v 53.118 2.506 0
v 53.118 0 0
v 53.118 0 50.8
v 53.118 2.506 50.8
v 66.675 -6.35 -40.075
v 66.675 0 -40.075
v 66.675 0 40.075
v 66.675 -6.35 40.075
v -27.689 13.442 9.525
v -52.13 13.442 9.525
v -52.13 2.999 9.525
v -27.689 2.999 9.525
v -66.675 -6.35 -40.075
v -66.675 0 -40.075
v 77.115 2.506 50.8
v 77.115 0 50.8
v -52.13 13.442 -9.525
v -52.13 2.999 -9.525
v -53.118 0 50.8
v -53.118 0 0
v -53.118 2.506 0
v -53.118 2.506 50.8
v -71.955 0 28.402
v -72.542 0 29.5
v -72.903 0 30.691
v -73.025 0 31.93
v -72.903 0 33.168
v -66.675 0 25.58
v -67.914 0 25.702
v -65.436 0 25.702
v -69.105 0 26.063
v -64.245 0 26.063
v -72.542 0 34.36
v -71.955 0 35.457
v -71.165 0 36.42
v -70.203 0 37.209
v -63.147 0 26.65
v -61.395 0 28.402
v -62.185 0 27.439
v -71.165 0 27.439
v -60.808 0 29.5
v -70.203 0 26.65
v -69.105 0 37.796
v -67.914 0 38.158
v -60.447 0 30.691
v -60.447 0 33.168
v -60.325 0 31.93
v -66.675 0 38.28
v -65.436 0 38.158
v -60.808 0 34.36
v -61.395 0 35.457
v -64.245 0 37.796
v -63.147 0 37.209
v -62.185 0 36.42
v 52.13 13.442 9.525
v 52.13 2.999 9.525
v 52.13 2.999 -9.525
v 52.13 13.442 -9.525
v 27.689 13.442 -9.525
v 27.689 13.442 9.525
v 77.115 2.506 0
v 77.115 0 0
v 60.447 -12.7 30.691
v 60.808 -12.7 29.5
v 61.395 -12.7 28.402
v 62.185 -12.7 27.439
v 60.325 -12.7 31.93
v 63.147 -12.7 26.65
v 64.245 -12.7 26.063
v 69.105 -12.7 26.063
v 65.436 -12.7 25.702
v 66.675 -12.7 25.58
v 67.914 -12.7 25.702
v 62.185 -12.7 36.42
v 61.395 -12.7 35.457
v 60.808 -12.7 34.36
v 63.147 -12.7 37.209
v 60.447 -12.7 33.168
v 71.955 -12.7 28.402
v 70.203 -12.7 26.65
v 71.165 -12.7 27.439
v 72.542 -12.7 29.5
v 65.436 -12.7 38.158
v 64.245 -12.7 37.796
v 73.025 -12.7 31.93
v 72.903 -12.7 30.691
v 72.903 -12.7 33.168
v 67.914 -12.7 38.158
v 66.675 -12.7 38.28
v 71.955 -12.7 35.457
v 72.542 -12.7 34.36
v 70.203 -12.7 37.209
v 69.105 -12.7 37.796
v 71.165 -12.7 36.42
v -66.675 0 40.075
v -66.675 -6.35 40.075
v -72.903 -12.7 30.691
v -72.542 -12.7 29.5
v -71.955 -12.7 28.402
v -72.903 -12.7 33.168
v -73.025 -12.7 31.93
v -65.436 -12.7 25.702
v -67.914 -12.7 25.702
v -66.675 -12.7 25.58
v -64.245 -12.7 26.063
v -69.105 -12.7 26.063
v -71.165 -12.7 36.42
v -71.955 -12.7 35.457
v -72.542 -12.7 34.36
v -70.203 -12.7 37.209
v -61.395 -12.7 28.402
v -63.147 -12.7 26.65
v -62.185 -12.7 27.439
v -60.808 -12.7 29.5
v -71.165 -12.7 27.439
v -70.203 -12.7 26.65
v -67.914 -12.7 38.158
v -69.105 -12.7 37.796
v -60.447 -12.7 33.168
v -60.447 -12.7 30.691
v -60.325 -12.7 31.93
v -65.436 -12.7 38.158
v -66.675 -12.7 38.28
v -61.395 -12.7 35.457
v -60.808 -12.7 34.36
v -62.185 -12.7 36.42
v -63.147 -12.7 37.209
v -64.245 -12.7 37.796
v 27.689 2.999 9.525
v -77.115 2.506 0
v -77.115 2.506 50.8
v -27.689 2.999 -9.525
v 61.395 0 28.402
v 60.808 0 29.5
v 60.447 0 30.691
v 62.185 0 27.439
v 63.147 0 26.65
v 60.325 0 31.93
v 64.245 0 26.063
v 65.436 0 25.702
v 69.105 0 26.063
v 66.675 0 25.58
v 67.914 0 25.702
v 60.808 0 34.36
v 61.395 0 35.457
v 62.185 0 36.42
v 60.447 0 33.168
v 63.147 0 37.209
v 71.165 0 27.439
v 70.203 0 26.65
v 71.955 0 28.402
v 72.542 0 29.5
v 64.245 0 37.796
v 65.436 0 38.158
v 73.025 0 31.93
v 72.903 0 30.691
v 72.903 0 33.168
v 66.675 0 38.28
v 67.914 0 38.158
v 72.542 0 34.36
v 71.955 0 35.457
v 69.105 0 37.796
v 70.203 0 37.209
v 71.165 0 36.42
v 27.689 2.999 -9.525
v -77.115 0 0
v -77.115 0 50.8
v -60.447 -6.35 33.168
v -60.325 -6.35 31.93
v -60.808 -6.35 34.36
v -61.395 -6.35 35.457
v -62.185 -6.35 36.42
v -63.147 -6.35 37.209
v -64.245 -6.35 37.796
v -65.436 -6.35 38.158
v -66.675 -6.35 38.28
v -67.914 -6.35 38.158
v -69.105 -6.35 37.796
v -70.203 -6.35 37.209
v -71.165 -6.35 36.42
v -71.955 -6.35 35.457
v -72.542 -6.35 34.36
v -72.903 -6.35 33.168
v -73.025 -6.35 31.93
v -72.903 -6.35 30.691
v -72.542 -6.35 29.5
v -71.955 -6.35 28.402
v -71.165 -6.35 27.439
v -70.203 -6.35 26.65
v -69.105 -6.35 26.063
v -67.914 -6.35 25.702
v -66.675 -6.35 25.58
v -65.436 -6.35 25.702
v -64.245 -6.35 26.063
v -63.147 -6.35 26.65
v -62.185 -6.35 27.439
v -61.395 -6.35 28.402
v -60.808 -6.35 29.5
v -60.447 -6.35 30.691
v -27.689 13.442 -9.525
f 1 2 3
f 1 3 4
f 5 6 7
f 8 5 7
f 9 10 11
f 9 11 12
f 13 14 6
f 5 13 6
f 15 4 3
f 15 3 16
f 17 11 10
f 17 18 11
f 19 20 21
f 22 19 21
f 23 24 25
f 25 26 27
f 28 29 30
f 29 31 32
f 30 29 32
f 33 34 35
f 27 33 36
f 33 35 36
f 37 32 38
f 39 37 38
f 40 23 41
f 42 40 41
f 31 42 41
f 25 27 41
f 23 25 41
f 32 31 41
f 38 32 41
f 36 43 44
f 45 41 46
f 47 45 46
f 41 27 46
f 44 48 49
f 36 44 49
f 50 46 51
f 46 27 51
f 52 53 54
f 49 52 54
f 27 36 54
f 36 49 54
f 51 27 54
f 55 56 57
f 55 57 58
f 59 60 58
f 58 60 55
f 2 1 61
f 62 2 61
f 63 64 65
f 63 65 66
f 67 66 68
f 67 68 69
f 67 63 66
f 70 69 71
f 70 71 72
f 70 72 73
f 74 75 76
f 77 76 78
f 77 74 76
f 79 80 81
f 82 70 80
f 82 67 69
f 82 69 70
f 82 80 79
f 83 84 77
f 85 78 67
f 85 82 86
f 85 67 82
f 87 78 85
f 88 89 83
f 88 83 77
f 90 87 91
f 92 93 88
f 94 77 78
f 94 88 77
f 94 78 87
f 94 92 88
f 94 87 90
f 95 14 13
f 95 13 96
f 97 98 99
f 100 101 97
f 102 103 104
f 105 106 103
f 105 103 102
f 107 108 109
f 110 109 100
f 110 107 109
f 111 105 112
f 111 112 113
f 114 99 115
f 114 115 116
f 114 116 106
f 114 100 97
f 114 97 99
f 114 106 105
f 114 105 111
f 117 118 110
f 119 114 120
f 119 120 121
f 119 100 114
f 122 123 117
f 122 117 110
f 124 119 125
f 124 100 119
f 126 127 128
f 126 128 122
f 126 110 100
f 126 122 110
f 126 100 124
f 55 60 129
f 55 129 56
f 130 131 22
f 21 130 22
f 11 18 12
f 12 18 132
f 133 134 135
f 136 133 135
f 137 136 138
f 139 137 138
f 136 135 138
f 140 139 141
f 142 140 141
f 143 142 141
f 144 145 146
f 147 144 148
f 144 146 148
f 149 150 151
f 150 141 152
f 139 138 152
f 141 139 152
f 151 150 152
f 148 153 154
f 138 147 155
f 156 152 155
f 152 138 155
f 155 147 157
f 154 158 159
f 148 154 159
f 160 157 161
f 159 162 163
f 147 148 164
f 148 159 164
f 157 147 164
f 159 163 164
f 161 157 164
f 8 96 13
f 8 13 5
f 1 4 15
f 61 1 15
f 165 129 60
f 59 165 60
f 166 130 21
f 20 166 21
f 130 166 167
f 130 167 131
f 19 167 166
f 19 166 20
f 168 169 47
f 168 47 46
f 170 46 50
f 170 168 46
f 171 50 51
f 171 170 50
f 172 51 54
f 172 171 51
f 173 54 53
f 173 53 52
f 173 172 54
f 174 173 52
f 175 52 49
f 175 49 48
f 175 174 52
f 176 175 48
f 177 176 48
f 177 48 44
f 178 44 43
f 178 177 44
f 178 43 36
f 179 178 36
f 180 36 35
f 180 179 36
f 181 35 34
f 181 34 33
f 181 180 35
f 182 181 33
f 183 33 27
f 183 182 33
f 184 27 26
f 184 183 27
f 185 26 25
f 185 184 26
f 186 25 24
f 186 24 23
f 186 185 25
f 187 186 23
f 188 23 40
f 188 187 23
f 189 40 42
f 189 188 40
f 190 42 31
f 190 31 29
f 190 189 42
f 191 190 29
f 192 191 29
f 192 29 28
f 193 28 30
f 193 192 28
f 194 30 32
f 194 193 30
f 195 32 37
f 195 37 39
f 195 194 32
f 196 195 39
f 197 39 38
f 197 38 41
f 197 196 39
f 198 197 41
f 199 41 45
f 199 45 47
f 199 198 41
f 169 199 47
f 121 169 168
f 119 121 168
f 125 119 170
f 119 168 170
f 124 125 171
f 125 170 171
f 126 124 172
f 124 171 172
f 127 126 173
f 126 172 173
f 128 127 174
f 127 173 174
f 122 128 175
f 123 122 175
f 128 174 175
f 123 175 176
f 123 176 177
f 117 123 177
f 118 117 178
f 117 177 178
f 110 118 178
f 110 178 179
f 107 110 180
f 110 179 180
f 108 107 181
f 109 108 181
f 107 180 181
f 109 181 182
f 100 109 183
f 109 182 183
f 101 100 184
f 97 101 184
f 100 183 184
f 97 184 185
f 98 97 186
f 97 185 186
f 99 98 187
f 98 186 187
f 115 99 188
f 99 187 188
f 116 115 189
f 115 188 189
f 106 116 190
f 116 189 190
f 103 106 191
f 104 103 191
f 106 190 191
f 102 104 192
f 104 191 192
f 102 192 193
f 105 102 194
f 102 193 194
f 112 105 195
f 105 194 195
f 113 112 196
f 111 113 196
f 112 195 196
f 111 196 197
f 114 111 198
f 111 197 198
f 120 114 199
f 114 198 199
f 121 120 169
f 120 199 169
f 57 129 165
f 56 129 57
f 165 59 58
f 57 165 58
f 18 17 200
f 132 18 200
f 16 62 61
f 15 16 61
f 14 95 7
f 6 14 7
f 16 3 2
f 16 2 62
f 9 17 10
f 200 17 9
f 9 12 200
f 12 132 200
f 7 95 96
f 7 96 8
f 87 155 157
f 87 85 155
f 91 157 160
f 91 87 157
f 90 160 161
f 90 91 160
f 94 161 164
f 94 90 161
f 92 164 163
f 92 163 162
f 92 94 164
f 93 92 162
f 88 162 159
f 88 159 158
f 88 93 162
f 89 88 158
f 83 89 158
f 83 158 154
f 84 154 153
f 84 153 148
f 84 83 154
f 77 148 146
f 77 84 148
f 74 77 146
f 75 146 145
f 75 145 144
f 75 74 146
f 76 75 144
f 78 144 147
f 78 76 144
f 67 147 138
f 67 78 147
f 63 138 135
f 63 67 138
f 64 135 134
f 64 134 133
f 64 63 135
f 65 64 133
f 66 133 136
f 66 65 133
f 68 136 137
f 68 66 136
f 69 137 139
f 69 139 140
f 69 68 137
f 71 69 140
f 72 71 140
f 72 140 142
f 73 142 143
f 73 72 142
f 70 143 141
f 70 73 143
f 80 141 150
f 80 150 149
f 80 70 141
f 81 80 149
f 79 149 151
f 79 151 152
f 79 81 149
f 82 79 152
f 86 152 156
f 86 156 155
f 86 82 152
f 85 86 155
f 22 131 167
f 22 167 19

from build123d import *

# Parameters (mm, degrees)
F0_W     = 133.35
F0_H     = 80.150222
F1_DEPTH = 6.35
F2_W     = 23.997132
F2_H     = 2.50613
F3_DEPTH = 50.8
F4_W     = 24.441525
F4_H     = 10.443195
F5_DEPTH = 9.525
F6_R     = 6.35
F7_DEPTH = 6.35


with BuildPart() as f1:
    # F0 (on Front) → F1 (new body)
    with BuildSketch(Plane.XZ):
        Rectangle(F0_W, F0_H)
    extrude(amount=F1_DEPTH)


with BuildPart() as f3:
    # F2 (on Top) → F3 (new body)
    with BuildSketch(Plane.XY):
        with Locations((-65.116679, 1.253065)):
            Rectangle(F2_W, F2_H)
        with Locations((65.116679, 1.253065)):
            Rectangle(F2_W, F2_H)
    extrude(amount=F3_DEPTH)


with BuildPart() as f5:
    # F4 (on Top) → F5 (new body, symmetric)
    with BuildSketch(Plane.XY):
        with Locations((-39.909392, 8.220365)):
            Rectangle(F4_W, F4_H)
        with Locations((39.909392, 8.220365)):
            Rectangle(F4_W, F4_H)
    extrude(amount=F5_DEPTH, both=True)


with BuildPart() as f7:
    # F6 (on face) → F7 (new body, symmetric)
    with BuildSketch(Plane.XZ.offset(6.35)):
        with Locations((-66.675, 31.929594)):
            Circle(F6_R)
        with Locations((66.675, 31.929594)):
            Circle(F6_R)
    extrude(amount=F7_DEPTH, both=True)


solid = Compound([f1.part, f3.part, f5.part, f7.part])
